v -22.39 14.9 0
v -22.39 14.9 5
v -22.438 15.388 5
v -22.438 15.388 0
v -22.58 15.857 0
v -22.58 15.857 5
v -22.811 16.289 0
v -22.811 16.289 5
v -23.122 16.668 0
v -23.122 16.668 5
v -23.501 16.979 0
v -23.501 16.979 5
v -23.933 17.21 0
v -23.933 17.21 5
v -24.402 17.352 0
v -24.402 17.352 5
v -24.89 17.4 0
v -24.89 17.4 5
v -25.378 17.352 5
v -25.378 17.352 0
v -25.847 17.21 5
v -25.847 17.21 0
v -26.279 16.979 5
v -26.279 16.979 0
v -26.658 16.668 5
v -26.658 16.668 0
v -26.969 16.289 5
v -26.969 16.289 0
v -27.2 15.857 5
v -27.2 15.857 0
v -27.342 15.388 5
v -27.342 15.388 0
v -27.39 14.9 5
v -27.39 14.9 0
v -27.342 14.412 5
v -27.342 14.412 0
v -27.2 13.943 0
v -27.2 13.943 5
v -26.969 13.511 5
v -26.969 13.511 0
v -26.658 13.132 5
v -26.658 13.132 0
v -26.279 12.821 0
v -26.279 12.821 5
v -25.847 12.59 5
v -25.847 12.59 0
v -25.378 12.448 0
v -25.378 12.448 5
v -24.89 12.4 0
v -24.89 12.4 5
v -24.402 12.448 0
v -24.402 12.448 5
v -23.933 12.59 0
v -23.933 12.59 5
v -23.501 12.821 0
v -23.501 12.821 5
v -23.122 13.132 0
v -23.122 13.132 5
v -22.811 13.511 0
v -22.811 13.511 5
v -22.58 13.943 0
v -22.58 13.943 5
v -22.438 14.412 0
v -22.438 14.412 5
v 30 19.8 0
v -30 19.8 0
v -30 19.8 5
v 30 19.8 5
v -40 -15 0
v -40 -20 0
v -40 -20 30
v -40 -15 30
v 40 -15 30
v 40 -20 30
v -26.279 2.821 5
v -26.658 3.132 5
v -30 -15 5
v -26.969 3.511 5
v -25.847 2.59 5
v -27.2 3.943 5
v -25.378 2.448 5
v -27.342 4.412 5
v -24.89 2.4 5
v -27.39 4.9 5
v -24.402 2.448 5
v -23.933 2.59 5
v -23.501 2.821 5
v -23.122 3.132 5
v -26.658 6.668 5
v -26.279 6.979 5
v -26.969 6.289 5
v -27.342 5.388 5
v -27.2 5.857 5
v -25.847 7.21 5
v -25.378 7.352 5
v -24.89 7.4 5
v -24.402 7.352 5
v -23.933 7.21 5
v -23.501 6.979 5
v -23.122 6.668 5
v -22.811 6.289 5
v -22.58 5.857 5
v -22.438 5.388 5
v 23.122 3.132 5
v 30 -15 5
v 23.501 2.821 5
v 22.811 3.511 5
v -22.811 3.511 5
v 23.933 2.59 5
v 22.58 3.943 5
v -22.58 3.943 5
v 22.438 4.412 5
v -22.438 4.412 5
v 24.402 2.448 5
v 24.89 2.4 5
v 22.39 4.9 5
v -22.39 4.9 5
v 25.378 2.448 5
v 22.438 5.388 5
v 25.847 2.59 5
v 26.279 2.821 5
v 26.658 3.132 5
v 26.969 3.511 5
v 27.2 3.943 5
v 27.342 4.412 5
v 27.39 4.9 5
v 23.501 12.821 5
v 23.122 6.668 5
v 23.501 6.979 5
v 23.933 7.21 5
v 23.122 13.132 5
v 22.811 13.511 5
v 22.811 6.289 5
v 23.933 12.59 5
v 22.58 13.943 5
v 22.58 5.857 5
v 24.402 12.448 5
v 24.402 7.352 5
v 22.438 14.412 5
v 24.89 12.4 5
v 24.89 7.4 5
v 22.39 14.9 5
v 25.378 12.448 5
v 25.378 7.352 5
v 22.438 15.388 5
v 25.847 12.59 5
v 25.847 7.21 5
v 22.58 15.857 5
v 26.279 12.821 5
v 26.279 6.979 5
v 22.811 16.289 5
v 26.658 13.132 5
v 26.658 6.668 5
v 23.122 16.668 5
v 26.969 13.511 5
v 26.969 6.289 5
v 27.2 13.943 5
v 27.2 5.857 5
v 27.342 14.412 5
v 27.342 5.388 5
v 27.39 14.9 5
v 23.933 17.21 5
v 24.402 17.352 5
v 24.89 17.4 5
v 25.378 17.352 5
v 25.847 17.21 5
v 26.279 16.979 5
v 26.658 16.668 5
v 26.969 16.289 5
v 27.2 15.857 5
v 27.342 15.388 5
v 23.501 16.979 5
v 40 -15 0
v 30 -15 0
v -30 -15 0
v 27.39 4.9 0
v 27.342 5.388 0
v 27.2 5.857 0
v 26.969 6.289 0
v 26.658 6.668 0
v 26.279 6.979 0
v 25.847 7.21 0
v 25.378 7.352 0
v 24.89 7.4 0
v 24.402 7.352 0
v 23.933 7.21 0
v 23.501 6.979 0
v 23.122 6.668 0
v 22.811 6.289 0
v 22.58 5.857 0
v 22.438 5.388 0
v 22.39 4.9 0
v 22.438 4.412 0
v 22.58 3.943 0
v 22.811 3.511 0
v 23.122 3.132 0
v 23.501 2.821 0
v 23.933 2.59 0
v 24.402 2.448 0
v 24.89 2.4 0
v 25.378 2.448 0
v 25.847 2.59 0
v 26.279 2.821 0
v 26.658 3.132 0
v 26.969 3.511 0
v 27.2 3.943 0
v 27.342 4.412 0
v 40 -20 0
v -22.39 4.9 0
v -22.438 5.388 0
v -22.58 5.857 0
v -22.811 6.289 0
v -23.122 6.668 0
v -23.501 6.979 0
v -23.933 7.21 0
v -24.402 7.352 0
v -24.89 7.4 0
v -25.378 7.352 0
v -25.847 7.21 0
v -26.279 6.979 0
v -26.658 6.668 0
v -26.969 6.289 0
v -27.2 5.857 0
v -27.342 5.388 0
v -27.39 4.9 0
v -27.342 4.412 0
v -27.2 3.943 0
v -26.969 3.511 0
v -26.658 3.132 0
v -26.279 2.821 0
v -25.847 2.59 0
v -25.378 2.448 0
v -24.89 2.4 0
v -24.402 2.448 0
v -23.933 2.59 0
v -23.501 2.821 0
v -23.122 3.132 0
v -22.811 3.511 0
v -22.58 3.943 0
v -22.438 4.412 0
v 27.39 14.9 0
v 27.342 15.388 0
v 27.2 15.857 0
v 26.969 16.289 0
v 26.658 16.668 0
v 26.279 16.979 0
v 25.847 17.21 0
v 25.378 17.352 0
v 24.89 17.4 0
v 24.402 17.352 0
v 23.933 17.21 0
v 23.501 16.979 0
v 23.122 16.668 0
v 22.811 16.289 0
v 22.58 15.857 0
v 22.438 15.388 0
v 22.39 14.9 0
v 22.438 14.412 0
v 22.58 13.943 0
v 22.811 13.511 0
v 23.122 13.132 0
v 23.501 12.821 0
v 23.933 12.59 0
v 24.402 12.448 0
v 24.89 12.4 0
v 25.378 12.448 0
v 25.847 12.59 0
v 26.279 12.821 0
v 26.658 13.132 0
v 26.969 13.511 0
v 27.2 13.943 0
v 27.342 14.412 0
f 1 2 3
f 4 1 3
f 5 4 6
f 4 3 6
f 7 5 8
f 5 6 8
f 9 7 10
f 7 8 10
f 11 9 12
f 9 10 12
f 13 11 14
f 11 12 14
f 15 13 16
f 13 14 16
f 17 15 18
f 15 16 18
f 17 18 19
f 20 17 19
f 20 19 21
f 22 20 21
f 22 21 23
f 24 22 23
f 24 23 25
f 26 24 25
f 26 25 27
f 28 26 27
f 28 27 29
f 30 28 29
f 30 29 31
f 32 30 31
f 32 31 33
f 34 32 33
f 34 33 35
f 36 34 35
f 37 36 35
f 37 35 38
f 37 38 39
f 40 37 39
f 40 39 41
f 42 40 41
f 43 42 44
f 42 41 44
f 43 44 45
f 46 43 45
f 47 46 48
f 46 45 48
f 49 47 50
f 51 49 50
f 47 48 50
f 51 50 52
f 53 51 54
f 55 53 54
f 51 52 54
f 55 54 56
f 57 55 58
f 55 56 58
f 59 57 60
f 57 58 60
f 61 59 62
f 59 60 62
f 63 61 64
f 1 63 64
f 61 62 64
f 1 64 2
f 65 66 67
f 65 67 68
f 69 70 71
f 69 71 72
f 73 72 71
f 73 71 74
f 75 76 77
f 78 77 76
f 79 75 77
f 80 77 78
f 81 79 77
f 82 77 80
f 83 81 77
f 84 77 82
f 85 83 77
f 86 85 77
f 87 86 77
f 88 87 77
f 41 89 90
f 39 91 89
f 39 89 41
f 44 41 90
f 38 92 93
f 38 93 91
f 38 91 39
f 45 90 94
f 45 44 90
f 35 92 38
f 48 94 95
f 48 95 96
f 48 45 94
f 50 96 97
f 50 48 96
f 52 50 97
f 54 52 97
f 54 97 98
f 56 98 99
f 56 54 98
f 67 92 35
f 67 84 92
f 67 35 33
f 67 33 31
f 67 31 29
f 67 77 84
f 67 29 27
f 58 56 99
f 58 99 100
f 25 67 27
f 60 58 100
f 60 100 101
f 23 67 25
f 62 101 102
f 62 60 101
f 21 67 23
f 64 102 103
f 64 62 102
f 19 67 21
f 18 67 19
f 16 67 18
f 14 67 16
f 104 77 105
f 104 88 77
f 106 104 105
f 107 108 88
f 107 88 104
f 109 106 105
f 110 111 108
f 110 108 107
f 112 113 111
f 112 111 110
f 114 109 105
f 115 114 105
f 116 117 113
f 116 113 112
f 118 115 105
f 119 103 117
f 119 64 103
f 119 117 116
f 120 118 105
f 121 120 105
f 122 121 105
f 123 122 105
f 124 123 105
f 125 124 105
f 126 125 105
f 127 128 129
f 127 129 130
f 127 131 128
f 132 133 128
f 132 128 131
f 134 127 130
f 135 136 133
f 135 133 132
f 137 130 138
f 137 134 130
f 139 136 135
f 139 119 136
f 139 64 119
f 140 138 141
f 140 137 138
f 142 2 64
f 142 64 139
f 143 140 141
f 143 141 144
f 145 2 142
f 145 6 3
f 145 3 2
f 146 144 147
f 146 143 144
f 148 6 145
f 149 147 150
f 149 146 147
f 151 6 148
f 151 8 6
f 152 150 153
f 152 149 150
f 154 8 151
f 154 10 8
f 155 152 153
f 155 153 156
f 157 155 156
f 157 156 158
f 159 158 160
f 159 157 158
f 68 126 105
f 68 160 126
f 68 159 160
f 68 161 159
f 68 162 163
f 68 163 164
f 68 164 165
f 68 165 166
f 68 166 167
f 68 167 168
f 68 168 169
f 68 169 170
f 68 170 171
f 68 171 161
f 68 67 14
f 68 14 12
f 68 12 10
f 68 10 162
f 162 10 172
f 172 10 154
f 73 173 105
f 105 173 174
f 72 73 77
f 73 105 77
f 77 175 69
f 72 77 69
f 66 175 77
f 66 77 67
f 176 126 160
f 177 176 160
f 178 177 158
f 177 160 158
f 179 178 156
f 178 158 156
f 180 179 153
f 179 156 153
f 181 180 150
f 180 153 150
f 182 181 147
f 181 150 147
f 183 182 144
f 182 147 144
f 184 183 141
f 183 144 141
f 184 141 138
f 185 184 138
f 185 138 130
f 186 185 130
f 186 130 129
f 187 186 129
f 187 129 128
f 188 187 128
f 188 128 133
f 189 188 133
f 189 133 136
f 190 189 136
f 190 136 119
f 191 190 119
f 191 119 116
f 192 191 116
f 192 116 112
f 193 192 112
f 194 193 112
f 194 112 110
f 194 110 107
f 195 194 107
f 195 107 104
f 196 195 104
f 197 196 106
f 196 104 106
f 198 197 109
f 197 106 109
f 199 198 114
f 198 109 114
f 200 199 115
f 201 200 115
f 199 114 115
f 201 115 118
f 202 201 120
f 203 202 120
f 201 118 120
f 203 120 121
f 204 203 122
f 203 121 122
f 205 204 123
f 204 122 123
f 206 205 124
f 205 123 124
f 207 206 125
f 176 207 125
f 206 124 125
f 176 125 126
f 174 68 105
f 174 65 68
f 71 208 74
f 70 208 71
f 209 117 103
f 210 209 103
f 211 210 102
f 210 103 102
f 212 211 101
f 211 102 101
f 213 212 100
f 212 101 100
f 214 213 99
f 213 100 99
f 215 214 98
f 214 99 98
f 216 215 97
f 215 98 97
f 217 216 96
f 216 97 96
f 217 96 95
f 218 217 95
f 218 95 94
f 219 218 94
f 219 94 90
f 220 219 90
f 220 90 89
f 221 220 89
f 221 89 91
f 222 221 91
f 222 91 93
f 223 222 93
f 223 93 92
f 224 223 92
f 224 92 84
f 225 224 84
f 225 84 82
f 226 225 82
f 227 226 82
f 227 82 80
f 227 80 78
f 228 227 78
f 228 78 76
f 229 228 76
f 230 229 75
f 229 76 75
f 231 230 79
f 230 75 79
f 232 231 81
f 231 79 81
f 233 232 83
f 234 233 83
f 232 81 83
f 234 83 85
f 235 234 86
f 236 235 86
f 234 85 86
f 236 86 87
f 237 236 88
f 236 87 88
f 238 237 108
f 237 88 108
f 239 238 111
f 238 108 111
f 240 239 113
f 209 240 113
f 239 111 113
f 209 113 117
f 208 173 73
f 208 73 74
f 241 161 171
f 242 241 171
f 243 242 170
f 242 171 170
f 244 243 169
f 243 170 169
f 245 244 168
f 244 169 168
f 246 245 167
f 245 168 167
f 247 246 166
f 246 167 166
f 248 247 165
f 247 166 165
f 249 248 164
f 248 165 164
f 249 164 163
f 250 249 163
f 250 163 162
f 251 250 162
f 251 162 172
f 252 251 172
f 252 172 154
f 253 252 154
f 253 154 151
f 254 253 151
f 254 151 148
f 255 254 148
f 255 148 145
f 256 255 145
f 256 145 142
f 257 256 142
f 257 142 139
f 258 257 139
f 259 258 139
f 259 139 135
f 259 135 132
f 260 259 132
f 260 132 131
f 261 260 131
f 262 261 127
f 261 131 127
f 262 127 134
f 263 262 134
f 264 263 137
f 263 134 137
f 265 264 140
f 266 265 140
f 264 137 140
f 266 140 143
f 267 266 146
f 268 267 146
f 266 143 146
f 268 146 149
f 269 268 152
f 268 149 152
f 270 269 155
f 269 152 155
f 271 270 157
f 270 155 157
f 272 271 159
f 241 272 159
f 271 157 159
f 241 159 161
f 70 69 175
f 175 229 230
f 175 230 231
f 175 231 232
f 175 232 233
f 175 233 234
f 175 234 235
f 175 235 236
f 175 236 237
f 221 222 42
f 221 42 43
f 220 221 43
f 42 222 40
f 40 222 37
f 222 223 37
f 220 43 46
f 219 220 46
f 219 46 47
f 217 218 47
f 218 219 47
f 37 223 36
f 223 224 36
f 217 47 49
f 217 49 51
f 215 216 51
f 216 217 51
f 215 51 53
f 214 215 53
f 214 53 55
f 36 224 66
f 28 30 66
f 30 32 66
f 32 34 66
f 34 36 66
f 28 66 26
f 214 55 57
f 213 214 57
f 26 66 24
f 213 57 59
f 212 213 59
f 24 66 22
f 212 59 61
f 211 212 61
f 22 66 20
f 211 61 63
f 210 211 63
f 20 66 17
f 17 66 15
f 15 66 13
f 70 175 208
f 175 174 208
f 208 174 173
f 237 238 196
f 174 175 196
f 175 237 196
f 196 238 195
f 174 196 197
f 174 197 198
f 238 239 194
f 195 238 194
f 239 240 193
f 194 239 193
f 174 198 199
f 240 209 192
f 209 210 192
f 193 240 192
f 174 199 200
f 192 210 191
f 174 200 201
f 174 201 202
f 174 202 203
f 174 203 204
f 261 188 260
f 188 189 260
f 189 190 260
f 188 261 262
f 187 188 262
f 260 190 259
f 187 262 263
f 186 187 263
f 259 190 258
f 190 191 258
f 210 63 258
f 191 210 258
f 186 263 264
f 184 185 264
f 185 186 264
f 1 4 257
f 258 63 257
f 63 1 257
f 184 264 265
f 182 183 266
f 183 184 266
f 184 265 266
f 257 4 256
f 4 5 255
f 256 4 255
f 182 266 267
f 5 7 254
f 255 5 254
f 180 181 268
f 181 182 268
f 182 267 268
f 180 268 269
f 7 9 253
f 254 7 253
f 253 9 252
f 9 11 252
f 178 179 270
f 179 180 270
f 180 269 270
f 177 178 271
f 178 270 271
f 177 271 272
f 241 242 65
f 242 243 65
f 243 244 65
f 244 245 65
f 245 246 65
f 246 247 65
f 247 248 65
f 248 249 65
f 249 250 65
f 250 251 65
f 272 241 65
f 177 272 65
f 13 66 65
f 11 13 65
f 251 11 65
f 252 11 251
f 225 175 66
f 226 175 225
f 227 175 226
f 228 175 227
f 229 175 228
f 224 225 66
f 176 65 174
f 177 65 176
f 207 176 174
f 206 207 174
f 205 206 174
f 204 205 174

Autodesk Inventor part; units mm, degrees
ref_plane "YZ Plane" through (0, 0, 0) normal (1, 0, 0) x (0, 1, 0)
ref_plane "XZ Plane" through (0, 0, 0) normal (0, 1, 0) x (-1, 0, 0)
ref_plane "XY Plane" through (0, 0, 0) normal (0, 0, 1) x (1, 0, 0)
sketch "Sketch1" plane through (0, 0, 0) normal (0, 0, 1) x (1, 0, 0)
  line L0 (-30, 19.8) -> (30, 19.8)
  line L1 (30, 19.8) -> (30, 0)
  line L2 (30, 0) -> (-30, 0)
  line L3 (-30, 0) -> (-30, 19.8)
  line L4 (-30, 0) -> (30, 0)
  line L5 (30, 0) -> (30, -15)
  line L6 (30, -15) -> (-30, -15)
  line L7 (-30, -15) -> (-30, 0)
  line L8 (-30, -15) -> (30, -15)
  line L9 (30, -15) -> (30, -20)
  line L10 (30, -20) -> (-30, -20)
  line L11 (-30, -20) -> (-30, -15)
  line L12 (-30, -17.5) -> (30, -17.5)
  line L13 (-40, -15) -> (40, -15)
  line L14 (40, -15) -> (40, -20)
  line L15 (40, -20) -> (-40, -20)
  line L16 (-40, -20) -> (-40, -15)
  line L17 (-40, -15) -> (40, -20) construction
  line L18 (40, -15) -> (-40, -20) construction
  line L19 (0, 0) -> (0, -20)
  point P0 (0, -17.5)
  point P1 (-40, -17.5)
  point P2 (-30, -15)
  dimension "d0" = 60
  dimension "d1" = 19.8
  dimension "d2" = 15
  dimension "d5" = 5
  dimension "d6" = 80
extrude "Extrusion1" add sketch "Sketch1" along normal blind 5 contours L0 L1 L2 L3 | L2 L19 L6 L7 | L5 L6 L19 L2
extrude "Extrusion2" add sketch "Sketch1" along normal blind 30 contours L6 L19 L12 L11 | L11 L15 L16 L13 | L9 L12 L19 L6 | L13 L14 L15 L9 | L12 L19 L10 L11 | L9 L10 L19 L12
sketch "Sketch2" plane through (0, 0, 5) normal (0, 0, 1) x (1, 0, 0)
  line L0 (-30, -15) -> (30, -15) projected
  line L1 (-29.9232, 0) -> (30, 0)
  line L2 (30, 0) -> (30, -15)
  line L3 (30, -15) -> (-29.9232, -15)
  line L4 (-29.9232, -15) -> (-29.9232, 0)
  line L5 (-30, 19.8) -> (-30, -15) projected
  line L6 (-30, 4.9) -> (30.0951, 4.9)
  line L7 (-30, 14.9) -> (30, 14.9)
  line L8 (30, -15) -> (30, 19.8) projected
  line L9 (30, 19.8) -> (-30, 19.8) projected
  circle A0 centre (-24.89, 4.9) radius 2.5
  circle A1 centre (24.89, 4.9) radius 2.5
  line L10 (-24.89, 4.9) -> (24.89, 4.9)
  line L11 (0, 0) -> (0, 4.9)
  line L12 (-30, 14.9) -> (-30, 4.9)
  line L13 (-30, 9.9) -> (30, 9.9)
  circle A2 centre (-24.89, 14.9) radius 2.5
  circle A3 centre (24.89, 14.9) radius 2.5
  dimension "d9" = 15
  dimension "d10" = 4.9
  dimension "d11" = 4.9
  dimension "d12" = 5
  dimension "d13" = 5
  dimension "d14" = 49.78
  dimension "d15" = 24.89
extrude "Extrusion3" cut sketch "Sketch2" against normal blind 30 contours A0 L6 | L6 A0 | A2 L7 | L7 A2 | A1 L6 | L6 A1 | A3 L7 | L7 A3
properties part number "fp v2 servo Mounting"
